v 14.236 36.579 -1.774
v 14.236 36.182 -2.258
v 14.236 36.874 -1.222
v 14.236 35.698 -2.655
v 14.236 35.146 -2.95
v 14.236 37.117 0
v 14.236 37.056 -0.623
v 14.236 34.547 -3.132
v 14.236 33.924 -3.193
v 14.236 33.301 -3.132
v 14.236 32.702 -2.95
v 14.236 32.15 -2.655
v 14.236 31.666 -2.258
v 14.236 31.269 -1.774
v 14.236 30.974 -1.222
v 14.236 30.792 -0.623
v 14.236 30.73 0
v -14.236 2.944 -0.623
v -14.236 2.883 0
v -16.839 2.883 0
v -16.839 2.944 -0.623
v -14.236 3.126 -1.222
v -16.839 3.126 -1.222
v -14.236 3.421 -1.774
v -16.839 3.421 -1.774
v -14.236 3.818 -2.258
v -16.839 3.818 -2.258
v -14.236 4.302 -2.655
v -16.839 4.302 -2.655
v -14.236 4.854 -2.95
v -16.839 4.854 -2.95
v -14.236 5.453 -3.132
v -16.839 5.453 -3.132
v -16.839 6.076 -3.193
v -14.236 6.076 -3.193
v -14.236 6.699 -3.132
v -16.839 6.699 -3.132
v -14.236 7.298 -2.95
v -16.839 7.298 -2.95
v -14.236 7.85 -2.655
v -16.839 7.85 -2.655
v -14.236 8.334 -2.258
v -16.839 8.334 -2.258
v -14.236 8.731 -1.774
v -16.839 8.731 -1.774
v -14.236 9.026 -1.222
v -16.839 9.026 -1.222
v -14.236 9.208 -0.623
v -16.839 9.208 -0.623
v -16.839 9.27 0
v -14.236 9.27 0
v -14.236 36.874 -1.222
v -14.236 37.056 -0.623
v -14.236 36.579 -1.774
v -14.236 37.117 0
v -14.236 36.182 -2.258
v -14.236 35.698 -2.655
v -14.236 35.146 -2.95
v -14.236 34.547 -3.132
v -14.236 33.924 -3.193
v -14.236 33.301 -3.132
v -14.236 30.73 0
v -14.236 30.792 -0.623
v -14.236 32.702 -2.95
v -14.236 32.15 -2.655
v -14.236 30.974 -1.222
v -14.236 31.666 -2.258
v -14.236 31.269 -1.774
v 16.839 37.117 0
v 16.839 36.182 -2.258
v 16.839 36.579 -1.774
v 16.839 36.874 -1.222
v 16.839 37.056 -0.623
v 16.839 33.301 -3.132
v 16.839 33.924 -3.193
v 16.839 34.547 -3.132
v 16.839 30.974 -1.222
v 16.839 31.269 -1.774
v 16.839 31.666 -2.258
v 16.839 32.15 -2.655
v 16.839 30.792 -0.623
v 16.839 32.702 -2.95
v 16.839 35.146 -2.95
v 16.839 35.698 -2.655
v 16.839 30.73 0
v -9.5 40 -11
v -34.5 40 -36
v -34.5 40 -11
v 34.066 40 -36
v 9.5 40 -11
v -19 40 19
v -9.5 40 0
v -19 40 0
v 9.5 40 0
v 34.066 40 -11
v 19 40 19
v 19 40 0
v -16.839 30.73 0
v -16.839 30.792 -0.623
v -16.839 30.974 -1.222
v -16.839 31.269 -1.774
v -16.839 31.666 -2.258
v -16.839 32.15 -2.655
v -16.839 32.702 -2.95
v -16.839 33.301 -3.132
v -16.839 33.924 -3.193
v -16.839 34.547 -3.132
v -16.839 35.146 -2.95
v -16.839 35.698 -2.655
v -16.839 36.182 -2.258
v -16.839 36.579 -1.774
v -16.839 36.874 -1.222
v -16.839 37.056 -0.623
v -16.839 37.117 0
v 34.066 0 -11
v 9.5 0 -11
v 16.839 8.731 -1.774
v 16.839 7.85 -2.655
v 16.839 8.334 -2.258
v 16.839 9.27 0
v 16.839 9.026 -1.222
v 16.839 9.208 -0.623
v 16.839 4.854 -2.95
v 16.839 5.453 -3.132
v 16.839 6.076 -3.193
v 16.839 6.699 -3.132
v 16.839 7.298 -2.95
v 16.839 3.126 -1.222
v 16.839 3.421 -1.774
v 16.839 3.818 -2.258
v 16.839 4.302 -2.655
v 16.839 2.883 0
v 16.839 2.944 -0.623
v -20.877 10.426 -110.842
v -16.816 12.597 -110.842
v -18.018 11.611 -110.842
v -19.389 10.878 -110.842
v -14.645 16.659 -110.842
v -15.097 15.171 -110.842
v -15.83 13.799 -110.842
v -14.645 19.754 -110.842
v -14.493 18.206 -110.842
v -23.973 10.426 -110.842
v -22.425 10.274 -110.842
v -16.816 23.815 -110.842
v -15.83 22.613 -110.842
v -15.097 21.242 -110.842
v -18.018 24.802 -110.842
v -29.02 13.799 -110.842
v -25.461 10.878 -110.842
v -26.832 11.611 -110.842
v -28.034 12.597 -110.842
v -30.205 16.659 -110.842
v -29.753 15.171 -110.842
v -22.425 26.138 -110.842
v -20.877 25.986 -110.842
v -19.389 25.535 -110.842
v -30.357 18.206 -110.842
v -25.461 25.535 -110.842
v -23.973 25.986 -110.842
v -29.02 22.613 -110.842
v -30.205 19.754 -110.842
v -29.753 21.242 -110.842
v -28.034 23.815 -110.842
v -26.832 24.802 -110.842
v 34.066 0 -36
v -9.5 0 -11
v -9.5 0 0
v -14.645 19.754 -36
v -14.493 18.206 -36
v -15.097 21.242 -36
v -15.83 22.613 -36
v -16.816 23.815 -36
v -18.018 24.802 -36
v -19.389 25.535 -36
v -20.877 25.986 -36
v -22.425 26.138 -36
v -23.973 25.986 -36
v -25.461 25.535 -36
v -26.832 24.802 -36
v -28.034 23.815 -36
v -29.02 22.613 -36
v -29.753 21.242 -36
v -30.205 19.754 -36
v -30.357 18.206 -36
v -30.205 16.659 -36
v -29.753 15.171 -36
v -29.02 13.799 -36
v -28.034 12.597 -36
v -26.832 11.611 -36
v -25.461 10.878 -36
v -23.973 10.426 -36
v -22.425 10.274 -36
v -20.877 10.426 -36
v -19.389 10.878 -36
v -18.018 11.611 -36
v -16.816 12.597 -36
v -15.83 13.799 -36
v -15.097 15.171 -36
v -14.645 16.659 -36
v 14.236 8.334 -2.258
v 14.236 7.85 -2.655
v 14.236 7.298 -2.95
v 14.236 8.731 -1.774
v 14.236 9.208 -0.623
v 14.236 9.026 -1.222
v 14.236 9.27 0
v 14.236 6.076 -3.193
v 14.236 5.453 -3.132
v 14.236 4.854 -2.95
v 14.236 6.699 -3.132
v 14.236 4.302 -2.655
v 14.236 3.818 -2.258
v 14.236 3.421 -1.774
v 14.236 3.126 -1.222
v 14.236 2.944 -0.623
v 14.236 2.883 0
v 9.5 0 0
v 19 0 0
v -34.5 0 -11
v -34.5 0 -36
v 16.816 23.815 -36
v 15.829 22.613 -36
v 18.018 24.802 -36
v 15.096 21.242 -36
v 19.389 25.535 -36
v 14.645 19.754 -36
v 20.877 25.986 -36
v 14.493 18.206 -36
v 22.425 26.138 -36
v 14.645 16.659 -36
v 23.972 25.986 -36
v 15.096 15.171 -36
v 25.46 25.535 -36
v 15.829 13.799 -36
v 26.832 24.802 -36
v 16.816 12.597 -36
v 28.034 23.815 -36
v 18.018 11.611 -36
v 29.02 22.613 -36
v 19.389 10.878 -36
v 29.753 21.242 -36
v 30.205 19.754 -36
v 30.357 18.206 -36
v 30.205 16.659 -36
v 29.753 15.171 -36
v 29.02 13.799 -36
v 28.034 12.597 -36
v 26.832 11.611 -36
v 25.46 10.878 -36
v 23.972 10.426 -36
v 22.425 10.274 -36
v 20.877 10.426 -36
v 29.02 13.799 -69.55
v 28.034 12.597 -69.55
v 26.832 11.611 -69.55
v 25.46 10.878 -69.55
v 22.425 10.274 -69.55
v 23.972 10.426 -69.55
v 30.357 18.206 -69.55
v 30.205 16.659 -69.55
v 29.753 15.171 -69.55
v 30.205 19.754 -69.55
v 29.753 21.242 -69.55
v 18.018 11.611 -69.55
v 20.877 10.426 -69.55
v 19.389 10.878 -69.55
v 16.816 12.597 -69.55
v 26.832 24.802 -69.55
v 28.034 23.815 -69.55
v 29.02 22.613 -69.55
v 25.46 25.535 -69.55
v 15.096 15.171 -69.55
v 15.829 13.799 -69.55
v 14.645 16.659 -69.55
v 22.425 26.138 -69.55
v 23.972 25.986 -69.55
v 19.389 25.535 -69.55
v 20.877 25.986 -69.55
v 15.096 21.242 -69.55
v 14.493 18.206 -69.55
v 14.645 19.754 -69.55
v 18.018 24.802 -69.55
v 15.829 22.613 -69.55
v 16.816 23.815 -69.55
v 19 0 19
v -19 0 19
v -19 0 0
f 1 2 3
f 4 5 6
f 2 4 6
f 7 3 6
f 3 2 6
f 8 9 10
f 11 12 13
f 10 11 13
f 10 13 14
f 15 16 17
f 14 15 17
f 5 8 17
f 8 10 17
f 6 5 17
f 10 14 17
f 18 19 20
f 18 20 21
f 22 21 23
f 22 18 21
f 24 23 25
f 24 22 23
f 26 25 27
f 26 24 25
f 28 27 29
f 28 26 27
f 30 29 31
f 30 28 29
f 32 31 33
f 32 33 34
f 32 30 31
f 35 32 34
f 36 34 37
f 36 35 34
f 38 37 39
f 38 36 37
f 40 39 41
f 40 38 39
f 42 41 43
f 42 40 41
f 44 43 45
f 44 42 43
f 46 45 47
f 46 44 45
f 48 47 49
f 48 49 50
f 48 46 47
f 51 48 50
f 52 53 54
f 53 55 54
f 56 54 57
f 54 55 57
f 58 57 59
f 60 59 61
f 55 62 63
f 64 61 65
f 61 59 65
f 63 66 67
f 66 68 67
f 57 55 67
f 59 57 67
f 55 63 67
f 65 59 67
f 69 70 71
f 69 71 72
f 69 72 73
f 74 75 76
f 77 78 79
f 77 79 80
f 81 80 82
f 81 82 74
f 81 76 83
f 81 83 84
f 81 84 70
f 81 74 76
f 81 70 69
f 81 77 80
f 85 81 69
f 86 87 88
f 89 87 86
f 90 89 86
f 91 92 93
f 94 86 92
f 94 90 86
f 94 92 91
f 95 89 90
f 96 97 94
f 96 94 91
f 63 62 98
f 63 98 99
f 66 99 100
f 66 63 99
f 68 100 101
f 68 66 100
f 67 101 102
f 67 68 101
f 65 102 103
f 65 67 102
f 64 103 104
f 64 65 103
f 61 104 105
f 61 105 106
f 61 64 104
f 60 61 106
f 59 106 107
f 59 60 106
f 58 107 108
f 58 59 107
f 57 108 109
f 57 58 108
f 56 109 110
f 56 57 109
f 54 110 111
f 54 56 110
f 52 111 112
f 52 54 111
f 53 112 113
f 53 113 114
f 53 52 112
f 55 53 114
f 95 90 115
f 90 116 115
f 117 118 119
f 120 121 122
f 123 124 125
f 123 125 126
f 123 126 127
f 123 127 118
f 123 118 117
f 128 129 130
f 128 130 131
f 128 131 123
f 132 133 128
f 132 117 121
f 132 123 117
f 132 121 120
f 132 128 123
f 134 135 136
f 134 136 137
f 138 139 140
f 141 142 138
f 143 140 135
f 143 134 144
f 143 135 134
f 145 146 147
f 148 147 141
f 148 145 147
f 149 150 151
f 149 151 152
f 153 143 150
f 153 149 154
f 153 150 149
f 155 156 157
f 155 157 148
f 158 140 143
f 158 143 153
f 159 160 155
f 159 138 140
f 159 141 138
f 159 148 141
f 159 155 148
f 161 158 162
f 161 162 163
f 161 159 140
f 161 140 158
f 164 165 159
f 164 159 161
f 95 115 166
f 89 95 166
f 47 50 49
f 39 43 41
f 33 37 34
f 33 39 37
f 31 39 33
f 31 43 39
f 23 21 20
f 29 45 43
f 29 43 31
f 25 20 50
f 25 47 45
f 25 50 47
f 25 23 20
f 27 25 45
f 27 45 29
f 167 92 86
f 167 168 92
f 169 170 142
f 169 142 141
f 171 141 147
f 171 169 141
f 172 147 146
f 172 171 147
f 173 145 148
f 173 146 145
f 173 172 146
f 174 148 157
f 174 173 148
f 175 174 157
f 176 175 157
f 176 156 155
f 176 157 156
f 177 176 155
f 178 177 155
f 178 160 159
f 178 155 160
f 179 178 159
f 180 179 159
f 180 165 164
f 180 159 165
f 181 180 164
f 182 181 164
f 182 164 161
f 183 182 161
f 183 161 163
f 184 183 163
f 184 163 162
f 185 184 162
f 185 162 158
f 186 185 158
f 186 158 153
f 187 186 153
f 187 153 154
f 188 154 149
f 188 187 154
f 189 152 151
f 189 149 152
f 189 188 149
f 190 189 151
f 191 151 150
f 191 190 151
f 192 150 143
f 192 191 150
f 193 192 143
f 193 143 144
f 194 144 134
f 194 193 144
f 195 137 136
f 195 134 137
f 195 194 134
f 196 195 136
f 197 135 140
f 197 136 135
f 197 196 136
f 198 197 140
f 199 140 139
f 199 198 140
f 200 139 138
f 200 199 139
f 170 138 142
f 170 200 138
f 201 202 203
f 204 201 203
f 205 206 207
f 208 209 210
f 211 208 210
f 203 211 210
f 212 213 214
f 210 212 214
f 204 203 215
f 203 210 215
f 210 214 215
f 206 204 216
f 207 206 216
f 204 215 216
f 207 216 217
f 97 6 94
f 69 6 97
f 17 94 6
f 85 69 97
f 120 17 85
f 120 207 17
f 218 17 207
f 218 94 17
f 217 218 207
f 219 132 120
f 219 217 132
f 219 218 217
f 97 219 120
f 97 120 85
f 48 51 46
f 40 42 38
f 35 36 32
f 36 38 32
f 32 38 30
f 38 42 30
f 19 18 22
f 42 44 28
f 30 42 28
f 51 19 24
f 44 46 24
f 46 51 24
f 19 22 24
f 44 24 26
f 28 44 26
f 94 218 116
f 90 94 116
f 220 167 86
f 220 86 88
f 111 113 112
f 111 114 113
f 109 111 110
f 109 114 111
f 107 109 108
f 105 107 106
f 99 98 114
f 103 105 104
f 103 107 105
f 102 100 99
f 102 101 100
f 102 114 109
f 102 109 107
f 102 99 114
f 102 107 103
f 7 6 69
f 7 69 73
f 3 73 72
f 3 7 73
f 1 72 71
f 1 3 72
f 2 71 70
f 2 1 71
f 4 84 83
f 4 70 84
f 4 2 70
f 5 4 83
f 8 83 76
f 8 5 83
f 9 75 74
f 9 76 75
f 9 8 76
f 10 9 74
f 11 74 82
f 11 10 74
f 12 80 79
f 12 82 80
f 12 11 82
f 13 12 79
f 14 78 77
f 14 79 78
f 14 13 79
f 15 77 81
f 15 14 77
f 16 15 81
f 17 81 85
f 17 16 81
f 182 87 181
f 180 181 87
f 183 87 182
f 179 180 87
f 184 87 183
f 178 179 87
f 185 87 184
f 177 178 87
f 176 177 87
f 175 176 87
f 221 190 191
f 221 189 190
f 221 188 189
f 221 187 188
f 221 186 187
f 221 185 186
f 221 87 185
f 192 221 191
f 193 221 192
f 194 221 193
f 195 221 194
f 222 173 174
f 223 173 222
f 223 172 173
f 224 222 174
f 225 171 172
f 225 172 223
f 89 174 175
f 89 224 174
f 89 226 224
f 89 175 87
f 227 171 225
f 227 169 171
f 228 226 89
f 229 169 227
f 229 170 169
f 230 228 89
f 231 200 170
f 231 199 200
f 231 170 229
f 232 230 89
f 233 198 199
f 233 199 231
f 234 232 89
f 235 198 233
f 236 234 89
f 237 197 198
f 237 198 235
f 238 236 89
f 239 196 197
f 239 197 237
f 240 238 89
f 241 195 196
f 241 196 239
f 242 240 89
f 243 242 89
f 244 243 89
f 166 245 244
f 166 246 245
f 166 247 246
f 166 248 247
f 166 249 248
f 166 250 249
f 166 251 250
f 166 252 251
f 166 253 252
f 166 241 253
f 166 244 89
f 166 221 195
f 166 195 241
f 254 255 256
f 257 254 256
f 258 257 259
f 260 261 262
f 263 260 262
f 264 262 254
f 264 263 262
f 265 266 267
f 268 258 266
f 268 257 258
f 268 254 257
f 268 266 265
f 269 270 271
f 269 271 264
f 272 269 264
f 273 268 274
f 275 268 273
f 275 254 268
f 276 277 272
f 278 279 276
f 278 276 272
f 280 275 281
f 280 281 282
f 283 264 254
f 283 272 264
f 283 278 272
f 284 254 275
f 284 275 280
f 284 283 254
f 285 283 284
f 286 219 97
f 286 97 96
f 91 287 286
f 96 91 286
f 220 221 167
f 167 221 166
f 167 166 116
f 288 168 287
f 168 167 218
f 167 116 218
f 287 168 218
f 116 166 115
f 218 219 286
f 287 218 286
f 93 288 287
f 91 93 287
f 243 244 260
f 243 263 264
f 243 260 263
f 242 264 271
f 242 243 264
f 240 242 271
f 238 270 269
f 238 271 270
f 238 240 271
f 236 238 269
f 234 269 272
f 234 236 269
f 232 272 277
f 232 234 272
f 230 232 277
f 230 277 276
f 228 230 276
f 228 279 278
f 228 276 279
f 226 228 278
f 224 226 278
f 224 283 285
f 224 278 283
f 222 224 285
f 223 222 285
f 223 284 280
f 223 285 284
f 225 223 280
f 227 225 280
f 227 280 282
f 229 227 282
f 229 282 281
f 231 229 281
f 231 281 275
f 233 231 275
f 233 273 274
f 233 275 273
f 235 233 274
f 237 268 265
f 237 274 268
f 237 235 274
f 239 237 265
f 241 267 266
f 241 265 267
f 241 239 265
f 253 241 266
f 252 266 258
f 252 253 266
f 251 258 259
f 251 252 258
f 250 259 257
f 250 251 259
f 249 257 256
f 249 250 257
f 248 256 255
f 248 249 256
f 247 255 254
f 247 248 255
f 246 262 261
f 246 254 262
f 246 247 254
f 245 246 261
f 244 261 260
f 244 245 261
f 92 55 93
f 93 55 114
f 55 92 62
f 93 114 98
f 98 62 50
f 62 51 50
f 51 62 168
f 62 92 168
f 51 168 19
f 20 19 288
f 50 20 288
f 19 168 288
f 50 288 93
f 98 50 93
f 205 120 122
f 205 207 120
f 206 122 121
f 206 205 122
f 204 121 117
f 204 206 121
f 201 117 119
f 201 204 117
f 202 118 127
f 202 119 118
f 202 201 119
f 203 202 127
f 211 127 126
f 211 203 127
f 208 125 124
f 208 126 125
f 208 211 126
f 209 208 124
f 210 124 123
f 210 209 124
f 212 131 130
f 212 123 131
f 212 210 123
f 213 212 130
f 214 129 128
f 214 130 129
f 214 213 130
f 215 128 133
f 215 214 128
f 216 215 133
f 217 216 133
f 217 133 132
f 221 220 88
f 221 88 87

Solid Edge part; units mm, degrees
sketch "Sketch1" plane through (0, 0, 0) normal (0, -1, 0) x (1, 0, 0)
  line L0 (9.5, -11) -> (34.0656, -11)
  line L1 (34.0656, -11) -> (34.0656, -36)
  line L2 (-34.5, -36) -> (34.0656, -36)
  line L3 (-34.5, -11) -> (-34.5, -36)
  line L4 (-9.5, -11) -> (-34.5, -11)
  line L5 (-9.5, -10) -> (-9.5, -11)
  line L6 (-9.5, 0) -> (-9.5, -10)
  line L7 (-9.5, 0) -> (-19, 0)
  line L8 (-19, 0) -> (-19, 19)
  line L9 (-19, 19) -> (19, 19)
  line L10 (19, 0) -> (19, 19)
  line L11 (9.5, 0) -> (19, 0)
  line L12 (9.5, 0) -> (9.5, -10)
  line L13 (9.5, -10) -> (9.5, -11)
extrude "Protrusion1" add sketch "Sketch1" against normal blind 40
sketch "Sketch2" plane through (-0.2172, 20, -36) normal (0, 0, -1) x (1, 0, 0)
  circle A0 centre (-22.2078, 1.7938) radius 7.9323
extrude "ExtrudedProtrusion_2" add sketch "Sketch2" along normal blind 74.8424
sketch "Sketch3" plane through (-0.2172, 20, -36) normal (0, 0, -1) x (1, 0, 0)
  circle A0 centre (22.6421, 1.7938) radius 7.9323
extrude "ExtrudedProtrusion_3" add sketch "Sketch3" along normal blind 33.5499
sketch "Sketch4" plane through (14.2364, 0, 0) normal (1, 0, 0) x (0, 1, 0)
  circle A0 centre (6.0761, 0) radius 3.1934
  circle A1 centre (33.9239, 0) radius 3.1934
extrude "ExtrudedProtrusion_5" add sketch "Sketch4" along normal blind 2.6025
mirror "Mirror1" about plane through (0, 0, 0) normal (1, 0, 0) of "ExtrudedProtrusion_5"
